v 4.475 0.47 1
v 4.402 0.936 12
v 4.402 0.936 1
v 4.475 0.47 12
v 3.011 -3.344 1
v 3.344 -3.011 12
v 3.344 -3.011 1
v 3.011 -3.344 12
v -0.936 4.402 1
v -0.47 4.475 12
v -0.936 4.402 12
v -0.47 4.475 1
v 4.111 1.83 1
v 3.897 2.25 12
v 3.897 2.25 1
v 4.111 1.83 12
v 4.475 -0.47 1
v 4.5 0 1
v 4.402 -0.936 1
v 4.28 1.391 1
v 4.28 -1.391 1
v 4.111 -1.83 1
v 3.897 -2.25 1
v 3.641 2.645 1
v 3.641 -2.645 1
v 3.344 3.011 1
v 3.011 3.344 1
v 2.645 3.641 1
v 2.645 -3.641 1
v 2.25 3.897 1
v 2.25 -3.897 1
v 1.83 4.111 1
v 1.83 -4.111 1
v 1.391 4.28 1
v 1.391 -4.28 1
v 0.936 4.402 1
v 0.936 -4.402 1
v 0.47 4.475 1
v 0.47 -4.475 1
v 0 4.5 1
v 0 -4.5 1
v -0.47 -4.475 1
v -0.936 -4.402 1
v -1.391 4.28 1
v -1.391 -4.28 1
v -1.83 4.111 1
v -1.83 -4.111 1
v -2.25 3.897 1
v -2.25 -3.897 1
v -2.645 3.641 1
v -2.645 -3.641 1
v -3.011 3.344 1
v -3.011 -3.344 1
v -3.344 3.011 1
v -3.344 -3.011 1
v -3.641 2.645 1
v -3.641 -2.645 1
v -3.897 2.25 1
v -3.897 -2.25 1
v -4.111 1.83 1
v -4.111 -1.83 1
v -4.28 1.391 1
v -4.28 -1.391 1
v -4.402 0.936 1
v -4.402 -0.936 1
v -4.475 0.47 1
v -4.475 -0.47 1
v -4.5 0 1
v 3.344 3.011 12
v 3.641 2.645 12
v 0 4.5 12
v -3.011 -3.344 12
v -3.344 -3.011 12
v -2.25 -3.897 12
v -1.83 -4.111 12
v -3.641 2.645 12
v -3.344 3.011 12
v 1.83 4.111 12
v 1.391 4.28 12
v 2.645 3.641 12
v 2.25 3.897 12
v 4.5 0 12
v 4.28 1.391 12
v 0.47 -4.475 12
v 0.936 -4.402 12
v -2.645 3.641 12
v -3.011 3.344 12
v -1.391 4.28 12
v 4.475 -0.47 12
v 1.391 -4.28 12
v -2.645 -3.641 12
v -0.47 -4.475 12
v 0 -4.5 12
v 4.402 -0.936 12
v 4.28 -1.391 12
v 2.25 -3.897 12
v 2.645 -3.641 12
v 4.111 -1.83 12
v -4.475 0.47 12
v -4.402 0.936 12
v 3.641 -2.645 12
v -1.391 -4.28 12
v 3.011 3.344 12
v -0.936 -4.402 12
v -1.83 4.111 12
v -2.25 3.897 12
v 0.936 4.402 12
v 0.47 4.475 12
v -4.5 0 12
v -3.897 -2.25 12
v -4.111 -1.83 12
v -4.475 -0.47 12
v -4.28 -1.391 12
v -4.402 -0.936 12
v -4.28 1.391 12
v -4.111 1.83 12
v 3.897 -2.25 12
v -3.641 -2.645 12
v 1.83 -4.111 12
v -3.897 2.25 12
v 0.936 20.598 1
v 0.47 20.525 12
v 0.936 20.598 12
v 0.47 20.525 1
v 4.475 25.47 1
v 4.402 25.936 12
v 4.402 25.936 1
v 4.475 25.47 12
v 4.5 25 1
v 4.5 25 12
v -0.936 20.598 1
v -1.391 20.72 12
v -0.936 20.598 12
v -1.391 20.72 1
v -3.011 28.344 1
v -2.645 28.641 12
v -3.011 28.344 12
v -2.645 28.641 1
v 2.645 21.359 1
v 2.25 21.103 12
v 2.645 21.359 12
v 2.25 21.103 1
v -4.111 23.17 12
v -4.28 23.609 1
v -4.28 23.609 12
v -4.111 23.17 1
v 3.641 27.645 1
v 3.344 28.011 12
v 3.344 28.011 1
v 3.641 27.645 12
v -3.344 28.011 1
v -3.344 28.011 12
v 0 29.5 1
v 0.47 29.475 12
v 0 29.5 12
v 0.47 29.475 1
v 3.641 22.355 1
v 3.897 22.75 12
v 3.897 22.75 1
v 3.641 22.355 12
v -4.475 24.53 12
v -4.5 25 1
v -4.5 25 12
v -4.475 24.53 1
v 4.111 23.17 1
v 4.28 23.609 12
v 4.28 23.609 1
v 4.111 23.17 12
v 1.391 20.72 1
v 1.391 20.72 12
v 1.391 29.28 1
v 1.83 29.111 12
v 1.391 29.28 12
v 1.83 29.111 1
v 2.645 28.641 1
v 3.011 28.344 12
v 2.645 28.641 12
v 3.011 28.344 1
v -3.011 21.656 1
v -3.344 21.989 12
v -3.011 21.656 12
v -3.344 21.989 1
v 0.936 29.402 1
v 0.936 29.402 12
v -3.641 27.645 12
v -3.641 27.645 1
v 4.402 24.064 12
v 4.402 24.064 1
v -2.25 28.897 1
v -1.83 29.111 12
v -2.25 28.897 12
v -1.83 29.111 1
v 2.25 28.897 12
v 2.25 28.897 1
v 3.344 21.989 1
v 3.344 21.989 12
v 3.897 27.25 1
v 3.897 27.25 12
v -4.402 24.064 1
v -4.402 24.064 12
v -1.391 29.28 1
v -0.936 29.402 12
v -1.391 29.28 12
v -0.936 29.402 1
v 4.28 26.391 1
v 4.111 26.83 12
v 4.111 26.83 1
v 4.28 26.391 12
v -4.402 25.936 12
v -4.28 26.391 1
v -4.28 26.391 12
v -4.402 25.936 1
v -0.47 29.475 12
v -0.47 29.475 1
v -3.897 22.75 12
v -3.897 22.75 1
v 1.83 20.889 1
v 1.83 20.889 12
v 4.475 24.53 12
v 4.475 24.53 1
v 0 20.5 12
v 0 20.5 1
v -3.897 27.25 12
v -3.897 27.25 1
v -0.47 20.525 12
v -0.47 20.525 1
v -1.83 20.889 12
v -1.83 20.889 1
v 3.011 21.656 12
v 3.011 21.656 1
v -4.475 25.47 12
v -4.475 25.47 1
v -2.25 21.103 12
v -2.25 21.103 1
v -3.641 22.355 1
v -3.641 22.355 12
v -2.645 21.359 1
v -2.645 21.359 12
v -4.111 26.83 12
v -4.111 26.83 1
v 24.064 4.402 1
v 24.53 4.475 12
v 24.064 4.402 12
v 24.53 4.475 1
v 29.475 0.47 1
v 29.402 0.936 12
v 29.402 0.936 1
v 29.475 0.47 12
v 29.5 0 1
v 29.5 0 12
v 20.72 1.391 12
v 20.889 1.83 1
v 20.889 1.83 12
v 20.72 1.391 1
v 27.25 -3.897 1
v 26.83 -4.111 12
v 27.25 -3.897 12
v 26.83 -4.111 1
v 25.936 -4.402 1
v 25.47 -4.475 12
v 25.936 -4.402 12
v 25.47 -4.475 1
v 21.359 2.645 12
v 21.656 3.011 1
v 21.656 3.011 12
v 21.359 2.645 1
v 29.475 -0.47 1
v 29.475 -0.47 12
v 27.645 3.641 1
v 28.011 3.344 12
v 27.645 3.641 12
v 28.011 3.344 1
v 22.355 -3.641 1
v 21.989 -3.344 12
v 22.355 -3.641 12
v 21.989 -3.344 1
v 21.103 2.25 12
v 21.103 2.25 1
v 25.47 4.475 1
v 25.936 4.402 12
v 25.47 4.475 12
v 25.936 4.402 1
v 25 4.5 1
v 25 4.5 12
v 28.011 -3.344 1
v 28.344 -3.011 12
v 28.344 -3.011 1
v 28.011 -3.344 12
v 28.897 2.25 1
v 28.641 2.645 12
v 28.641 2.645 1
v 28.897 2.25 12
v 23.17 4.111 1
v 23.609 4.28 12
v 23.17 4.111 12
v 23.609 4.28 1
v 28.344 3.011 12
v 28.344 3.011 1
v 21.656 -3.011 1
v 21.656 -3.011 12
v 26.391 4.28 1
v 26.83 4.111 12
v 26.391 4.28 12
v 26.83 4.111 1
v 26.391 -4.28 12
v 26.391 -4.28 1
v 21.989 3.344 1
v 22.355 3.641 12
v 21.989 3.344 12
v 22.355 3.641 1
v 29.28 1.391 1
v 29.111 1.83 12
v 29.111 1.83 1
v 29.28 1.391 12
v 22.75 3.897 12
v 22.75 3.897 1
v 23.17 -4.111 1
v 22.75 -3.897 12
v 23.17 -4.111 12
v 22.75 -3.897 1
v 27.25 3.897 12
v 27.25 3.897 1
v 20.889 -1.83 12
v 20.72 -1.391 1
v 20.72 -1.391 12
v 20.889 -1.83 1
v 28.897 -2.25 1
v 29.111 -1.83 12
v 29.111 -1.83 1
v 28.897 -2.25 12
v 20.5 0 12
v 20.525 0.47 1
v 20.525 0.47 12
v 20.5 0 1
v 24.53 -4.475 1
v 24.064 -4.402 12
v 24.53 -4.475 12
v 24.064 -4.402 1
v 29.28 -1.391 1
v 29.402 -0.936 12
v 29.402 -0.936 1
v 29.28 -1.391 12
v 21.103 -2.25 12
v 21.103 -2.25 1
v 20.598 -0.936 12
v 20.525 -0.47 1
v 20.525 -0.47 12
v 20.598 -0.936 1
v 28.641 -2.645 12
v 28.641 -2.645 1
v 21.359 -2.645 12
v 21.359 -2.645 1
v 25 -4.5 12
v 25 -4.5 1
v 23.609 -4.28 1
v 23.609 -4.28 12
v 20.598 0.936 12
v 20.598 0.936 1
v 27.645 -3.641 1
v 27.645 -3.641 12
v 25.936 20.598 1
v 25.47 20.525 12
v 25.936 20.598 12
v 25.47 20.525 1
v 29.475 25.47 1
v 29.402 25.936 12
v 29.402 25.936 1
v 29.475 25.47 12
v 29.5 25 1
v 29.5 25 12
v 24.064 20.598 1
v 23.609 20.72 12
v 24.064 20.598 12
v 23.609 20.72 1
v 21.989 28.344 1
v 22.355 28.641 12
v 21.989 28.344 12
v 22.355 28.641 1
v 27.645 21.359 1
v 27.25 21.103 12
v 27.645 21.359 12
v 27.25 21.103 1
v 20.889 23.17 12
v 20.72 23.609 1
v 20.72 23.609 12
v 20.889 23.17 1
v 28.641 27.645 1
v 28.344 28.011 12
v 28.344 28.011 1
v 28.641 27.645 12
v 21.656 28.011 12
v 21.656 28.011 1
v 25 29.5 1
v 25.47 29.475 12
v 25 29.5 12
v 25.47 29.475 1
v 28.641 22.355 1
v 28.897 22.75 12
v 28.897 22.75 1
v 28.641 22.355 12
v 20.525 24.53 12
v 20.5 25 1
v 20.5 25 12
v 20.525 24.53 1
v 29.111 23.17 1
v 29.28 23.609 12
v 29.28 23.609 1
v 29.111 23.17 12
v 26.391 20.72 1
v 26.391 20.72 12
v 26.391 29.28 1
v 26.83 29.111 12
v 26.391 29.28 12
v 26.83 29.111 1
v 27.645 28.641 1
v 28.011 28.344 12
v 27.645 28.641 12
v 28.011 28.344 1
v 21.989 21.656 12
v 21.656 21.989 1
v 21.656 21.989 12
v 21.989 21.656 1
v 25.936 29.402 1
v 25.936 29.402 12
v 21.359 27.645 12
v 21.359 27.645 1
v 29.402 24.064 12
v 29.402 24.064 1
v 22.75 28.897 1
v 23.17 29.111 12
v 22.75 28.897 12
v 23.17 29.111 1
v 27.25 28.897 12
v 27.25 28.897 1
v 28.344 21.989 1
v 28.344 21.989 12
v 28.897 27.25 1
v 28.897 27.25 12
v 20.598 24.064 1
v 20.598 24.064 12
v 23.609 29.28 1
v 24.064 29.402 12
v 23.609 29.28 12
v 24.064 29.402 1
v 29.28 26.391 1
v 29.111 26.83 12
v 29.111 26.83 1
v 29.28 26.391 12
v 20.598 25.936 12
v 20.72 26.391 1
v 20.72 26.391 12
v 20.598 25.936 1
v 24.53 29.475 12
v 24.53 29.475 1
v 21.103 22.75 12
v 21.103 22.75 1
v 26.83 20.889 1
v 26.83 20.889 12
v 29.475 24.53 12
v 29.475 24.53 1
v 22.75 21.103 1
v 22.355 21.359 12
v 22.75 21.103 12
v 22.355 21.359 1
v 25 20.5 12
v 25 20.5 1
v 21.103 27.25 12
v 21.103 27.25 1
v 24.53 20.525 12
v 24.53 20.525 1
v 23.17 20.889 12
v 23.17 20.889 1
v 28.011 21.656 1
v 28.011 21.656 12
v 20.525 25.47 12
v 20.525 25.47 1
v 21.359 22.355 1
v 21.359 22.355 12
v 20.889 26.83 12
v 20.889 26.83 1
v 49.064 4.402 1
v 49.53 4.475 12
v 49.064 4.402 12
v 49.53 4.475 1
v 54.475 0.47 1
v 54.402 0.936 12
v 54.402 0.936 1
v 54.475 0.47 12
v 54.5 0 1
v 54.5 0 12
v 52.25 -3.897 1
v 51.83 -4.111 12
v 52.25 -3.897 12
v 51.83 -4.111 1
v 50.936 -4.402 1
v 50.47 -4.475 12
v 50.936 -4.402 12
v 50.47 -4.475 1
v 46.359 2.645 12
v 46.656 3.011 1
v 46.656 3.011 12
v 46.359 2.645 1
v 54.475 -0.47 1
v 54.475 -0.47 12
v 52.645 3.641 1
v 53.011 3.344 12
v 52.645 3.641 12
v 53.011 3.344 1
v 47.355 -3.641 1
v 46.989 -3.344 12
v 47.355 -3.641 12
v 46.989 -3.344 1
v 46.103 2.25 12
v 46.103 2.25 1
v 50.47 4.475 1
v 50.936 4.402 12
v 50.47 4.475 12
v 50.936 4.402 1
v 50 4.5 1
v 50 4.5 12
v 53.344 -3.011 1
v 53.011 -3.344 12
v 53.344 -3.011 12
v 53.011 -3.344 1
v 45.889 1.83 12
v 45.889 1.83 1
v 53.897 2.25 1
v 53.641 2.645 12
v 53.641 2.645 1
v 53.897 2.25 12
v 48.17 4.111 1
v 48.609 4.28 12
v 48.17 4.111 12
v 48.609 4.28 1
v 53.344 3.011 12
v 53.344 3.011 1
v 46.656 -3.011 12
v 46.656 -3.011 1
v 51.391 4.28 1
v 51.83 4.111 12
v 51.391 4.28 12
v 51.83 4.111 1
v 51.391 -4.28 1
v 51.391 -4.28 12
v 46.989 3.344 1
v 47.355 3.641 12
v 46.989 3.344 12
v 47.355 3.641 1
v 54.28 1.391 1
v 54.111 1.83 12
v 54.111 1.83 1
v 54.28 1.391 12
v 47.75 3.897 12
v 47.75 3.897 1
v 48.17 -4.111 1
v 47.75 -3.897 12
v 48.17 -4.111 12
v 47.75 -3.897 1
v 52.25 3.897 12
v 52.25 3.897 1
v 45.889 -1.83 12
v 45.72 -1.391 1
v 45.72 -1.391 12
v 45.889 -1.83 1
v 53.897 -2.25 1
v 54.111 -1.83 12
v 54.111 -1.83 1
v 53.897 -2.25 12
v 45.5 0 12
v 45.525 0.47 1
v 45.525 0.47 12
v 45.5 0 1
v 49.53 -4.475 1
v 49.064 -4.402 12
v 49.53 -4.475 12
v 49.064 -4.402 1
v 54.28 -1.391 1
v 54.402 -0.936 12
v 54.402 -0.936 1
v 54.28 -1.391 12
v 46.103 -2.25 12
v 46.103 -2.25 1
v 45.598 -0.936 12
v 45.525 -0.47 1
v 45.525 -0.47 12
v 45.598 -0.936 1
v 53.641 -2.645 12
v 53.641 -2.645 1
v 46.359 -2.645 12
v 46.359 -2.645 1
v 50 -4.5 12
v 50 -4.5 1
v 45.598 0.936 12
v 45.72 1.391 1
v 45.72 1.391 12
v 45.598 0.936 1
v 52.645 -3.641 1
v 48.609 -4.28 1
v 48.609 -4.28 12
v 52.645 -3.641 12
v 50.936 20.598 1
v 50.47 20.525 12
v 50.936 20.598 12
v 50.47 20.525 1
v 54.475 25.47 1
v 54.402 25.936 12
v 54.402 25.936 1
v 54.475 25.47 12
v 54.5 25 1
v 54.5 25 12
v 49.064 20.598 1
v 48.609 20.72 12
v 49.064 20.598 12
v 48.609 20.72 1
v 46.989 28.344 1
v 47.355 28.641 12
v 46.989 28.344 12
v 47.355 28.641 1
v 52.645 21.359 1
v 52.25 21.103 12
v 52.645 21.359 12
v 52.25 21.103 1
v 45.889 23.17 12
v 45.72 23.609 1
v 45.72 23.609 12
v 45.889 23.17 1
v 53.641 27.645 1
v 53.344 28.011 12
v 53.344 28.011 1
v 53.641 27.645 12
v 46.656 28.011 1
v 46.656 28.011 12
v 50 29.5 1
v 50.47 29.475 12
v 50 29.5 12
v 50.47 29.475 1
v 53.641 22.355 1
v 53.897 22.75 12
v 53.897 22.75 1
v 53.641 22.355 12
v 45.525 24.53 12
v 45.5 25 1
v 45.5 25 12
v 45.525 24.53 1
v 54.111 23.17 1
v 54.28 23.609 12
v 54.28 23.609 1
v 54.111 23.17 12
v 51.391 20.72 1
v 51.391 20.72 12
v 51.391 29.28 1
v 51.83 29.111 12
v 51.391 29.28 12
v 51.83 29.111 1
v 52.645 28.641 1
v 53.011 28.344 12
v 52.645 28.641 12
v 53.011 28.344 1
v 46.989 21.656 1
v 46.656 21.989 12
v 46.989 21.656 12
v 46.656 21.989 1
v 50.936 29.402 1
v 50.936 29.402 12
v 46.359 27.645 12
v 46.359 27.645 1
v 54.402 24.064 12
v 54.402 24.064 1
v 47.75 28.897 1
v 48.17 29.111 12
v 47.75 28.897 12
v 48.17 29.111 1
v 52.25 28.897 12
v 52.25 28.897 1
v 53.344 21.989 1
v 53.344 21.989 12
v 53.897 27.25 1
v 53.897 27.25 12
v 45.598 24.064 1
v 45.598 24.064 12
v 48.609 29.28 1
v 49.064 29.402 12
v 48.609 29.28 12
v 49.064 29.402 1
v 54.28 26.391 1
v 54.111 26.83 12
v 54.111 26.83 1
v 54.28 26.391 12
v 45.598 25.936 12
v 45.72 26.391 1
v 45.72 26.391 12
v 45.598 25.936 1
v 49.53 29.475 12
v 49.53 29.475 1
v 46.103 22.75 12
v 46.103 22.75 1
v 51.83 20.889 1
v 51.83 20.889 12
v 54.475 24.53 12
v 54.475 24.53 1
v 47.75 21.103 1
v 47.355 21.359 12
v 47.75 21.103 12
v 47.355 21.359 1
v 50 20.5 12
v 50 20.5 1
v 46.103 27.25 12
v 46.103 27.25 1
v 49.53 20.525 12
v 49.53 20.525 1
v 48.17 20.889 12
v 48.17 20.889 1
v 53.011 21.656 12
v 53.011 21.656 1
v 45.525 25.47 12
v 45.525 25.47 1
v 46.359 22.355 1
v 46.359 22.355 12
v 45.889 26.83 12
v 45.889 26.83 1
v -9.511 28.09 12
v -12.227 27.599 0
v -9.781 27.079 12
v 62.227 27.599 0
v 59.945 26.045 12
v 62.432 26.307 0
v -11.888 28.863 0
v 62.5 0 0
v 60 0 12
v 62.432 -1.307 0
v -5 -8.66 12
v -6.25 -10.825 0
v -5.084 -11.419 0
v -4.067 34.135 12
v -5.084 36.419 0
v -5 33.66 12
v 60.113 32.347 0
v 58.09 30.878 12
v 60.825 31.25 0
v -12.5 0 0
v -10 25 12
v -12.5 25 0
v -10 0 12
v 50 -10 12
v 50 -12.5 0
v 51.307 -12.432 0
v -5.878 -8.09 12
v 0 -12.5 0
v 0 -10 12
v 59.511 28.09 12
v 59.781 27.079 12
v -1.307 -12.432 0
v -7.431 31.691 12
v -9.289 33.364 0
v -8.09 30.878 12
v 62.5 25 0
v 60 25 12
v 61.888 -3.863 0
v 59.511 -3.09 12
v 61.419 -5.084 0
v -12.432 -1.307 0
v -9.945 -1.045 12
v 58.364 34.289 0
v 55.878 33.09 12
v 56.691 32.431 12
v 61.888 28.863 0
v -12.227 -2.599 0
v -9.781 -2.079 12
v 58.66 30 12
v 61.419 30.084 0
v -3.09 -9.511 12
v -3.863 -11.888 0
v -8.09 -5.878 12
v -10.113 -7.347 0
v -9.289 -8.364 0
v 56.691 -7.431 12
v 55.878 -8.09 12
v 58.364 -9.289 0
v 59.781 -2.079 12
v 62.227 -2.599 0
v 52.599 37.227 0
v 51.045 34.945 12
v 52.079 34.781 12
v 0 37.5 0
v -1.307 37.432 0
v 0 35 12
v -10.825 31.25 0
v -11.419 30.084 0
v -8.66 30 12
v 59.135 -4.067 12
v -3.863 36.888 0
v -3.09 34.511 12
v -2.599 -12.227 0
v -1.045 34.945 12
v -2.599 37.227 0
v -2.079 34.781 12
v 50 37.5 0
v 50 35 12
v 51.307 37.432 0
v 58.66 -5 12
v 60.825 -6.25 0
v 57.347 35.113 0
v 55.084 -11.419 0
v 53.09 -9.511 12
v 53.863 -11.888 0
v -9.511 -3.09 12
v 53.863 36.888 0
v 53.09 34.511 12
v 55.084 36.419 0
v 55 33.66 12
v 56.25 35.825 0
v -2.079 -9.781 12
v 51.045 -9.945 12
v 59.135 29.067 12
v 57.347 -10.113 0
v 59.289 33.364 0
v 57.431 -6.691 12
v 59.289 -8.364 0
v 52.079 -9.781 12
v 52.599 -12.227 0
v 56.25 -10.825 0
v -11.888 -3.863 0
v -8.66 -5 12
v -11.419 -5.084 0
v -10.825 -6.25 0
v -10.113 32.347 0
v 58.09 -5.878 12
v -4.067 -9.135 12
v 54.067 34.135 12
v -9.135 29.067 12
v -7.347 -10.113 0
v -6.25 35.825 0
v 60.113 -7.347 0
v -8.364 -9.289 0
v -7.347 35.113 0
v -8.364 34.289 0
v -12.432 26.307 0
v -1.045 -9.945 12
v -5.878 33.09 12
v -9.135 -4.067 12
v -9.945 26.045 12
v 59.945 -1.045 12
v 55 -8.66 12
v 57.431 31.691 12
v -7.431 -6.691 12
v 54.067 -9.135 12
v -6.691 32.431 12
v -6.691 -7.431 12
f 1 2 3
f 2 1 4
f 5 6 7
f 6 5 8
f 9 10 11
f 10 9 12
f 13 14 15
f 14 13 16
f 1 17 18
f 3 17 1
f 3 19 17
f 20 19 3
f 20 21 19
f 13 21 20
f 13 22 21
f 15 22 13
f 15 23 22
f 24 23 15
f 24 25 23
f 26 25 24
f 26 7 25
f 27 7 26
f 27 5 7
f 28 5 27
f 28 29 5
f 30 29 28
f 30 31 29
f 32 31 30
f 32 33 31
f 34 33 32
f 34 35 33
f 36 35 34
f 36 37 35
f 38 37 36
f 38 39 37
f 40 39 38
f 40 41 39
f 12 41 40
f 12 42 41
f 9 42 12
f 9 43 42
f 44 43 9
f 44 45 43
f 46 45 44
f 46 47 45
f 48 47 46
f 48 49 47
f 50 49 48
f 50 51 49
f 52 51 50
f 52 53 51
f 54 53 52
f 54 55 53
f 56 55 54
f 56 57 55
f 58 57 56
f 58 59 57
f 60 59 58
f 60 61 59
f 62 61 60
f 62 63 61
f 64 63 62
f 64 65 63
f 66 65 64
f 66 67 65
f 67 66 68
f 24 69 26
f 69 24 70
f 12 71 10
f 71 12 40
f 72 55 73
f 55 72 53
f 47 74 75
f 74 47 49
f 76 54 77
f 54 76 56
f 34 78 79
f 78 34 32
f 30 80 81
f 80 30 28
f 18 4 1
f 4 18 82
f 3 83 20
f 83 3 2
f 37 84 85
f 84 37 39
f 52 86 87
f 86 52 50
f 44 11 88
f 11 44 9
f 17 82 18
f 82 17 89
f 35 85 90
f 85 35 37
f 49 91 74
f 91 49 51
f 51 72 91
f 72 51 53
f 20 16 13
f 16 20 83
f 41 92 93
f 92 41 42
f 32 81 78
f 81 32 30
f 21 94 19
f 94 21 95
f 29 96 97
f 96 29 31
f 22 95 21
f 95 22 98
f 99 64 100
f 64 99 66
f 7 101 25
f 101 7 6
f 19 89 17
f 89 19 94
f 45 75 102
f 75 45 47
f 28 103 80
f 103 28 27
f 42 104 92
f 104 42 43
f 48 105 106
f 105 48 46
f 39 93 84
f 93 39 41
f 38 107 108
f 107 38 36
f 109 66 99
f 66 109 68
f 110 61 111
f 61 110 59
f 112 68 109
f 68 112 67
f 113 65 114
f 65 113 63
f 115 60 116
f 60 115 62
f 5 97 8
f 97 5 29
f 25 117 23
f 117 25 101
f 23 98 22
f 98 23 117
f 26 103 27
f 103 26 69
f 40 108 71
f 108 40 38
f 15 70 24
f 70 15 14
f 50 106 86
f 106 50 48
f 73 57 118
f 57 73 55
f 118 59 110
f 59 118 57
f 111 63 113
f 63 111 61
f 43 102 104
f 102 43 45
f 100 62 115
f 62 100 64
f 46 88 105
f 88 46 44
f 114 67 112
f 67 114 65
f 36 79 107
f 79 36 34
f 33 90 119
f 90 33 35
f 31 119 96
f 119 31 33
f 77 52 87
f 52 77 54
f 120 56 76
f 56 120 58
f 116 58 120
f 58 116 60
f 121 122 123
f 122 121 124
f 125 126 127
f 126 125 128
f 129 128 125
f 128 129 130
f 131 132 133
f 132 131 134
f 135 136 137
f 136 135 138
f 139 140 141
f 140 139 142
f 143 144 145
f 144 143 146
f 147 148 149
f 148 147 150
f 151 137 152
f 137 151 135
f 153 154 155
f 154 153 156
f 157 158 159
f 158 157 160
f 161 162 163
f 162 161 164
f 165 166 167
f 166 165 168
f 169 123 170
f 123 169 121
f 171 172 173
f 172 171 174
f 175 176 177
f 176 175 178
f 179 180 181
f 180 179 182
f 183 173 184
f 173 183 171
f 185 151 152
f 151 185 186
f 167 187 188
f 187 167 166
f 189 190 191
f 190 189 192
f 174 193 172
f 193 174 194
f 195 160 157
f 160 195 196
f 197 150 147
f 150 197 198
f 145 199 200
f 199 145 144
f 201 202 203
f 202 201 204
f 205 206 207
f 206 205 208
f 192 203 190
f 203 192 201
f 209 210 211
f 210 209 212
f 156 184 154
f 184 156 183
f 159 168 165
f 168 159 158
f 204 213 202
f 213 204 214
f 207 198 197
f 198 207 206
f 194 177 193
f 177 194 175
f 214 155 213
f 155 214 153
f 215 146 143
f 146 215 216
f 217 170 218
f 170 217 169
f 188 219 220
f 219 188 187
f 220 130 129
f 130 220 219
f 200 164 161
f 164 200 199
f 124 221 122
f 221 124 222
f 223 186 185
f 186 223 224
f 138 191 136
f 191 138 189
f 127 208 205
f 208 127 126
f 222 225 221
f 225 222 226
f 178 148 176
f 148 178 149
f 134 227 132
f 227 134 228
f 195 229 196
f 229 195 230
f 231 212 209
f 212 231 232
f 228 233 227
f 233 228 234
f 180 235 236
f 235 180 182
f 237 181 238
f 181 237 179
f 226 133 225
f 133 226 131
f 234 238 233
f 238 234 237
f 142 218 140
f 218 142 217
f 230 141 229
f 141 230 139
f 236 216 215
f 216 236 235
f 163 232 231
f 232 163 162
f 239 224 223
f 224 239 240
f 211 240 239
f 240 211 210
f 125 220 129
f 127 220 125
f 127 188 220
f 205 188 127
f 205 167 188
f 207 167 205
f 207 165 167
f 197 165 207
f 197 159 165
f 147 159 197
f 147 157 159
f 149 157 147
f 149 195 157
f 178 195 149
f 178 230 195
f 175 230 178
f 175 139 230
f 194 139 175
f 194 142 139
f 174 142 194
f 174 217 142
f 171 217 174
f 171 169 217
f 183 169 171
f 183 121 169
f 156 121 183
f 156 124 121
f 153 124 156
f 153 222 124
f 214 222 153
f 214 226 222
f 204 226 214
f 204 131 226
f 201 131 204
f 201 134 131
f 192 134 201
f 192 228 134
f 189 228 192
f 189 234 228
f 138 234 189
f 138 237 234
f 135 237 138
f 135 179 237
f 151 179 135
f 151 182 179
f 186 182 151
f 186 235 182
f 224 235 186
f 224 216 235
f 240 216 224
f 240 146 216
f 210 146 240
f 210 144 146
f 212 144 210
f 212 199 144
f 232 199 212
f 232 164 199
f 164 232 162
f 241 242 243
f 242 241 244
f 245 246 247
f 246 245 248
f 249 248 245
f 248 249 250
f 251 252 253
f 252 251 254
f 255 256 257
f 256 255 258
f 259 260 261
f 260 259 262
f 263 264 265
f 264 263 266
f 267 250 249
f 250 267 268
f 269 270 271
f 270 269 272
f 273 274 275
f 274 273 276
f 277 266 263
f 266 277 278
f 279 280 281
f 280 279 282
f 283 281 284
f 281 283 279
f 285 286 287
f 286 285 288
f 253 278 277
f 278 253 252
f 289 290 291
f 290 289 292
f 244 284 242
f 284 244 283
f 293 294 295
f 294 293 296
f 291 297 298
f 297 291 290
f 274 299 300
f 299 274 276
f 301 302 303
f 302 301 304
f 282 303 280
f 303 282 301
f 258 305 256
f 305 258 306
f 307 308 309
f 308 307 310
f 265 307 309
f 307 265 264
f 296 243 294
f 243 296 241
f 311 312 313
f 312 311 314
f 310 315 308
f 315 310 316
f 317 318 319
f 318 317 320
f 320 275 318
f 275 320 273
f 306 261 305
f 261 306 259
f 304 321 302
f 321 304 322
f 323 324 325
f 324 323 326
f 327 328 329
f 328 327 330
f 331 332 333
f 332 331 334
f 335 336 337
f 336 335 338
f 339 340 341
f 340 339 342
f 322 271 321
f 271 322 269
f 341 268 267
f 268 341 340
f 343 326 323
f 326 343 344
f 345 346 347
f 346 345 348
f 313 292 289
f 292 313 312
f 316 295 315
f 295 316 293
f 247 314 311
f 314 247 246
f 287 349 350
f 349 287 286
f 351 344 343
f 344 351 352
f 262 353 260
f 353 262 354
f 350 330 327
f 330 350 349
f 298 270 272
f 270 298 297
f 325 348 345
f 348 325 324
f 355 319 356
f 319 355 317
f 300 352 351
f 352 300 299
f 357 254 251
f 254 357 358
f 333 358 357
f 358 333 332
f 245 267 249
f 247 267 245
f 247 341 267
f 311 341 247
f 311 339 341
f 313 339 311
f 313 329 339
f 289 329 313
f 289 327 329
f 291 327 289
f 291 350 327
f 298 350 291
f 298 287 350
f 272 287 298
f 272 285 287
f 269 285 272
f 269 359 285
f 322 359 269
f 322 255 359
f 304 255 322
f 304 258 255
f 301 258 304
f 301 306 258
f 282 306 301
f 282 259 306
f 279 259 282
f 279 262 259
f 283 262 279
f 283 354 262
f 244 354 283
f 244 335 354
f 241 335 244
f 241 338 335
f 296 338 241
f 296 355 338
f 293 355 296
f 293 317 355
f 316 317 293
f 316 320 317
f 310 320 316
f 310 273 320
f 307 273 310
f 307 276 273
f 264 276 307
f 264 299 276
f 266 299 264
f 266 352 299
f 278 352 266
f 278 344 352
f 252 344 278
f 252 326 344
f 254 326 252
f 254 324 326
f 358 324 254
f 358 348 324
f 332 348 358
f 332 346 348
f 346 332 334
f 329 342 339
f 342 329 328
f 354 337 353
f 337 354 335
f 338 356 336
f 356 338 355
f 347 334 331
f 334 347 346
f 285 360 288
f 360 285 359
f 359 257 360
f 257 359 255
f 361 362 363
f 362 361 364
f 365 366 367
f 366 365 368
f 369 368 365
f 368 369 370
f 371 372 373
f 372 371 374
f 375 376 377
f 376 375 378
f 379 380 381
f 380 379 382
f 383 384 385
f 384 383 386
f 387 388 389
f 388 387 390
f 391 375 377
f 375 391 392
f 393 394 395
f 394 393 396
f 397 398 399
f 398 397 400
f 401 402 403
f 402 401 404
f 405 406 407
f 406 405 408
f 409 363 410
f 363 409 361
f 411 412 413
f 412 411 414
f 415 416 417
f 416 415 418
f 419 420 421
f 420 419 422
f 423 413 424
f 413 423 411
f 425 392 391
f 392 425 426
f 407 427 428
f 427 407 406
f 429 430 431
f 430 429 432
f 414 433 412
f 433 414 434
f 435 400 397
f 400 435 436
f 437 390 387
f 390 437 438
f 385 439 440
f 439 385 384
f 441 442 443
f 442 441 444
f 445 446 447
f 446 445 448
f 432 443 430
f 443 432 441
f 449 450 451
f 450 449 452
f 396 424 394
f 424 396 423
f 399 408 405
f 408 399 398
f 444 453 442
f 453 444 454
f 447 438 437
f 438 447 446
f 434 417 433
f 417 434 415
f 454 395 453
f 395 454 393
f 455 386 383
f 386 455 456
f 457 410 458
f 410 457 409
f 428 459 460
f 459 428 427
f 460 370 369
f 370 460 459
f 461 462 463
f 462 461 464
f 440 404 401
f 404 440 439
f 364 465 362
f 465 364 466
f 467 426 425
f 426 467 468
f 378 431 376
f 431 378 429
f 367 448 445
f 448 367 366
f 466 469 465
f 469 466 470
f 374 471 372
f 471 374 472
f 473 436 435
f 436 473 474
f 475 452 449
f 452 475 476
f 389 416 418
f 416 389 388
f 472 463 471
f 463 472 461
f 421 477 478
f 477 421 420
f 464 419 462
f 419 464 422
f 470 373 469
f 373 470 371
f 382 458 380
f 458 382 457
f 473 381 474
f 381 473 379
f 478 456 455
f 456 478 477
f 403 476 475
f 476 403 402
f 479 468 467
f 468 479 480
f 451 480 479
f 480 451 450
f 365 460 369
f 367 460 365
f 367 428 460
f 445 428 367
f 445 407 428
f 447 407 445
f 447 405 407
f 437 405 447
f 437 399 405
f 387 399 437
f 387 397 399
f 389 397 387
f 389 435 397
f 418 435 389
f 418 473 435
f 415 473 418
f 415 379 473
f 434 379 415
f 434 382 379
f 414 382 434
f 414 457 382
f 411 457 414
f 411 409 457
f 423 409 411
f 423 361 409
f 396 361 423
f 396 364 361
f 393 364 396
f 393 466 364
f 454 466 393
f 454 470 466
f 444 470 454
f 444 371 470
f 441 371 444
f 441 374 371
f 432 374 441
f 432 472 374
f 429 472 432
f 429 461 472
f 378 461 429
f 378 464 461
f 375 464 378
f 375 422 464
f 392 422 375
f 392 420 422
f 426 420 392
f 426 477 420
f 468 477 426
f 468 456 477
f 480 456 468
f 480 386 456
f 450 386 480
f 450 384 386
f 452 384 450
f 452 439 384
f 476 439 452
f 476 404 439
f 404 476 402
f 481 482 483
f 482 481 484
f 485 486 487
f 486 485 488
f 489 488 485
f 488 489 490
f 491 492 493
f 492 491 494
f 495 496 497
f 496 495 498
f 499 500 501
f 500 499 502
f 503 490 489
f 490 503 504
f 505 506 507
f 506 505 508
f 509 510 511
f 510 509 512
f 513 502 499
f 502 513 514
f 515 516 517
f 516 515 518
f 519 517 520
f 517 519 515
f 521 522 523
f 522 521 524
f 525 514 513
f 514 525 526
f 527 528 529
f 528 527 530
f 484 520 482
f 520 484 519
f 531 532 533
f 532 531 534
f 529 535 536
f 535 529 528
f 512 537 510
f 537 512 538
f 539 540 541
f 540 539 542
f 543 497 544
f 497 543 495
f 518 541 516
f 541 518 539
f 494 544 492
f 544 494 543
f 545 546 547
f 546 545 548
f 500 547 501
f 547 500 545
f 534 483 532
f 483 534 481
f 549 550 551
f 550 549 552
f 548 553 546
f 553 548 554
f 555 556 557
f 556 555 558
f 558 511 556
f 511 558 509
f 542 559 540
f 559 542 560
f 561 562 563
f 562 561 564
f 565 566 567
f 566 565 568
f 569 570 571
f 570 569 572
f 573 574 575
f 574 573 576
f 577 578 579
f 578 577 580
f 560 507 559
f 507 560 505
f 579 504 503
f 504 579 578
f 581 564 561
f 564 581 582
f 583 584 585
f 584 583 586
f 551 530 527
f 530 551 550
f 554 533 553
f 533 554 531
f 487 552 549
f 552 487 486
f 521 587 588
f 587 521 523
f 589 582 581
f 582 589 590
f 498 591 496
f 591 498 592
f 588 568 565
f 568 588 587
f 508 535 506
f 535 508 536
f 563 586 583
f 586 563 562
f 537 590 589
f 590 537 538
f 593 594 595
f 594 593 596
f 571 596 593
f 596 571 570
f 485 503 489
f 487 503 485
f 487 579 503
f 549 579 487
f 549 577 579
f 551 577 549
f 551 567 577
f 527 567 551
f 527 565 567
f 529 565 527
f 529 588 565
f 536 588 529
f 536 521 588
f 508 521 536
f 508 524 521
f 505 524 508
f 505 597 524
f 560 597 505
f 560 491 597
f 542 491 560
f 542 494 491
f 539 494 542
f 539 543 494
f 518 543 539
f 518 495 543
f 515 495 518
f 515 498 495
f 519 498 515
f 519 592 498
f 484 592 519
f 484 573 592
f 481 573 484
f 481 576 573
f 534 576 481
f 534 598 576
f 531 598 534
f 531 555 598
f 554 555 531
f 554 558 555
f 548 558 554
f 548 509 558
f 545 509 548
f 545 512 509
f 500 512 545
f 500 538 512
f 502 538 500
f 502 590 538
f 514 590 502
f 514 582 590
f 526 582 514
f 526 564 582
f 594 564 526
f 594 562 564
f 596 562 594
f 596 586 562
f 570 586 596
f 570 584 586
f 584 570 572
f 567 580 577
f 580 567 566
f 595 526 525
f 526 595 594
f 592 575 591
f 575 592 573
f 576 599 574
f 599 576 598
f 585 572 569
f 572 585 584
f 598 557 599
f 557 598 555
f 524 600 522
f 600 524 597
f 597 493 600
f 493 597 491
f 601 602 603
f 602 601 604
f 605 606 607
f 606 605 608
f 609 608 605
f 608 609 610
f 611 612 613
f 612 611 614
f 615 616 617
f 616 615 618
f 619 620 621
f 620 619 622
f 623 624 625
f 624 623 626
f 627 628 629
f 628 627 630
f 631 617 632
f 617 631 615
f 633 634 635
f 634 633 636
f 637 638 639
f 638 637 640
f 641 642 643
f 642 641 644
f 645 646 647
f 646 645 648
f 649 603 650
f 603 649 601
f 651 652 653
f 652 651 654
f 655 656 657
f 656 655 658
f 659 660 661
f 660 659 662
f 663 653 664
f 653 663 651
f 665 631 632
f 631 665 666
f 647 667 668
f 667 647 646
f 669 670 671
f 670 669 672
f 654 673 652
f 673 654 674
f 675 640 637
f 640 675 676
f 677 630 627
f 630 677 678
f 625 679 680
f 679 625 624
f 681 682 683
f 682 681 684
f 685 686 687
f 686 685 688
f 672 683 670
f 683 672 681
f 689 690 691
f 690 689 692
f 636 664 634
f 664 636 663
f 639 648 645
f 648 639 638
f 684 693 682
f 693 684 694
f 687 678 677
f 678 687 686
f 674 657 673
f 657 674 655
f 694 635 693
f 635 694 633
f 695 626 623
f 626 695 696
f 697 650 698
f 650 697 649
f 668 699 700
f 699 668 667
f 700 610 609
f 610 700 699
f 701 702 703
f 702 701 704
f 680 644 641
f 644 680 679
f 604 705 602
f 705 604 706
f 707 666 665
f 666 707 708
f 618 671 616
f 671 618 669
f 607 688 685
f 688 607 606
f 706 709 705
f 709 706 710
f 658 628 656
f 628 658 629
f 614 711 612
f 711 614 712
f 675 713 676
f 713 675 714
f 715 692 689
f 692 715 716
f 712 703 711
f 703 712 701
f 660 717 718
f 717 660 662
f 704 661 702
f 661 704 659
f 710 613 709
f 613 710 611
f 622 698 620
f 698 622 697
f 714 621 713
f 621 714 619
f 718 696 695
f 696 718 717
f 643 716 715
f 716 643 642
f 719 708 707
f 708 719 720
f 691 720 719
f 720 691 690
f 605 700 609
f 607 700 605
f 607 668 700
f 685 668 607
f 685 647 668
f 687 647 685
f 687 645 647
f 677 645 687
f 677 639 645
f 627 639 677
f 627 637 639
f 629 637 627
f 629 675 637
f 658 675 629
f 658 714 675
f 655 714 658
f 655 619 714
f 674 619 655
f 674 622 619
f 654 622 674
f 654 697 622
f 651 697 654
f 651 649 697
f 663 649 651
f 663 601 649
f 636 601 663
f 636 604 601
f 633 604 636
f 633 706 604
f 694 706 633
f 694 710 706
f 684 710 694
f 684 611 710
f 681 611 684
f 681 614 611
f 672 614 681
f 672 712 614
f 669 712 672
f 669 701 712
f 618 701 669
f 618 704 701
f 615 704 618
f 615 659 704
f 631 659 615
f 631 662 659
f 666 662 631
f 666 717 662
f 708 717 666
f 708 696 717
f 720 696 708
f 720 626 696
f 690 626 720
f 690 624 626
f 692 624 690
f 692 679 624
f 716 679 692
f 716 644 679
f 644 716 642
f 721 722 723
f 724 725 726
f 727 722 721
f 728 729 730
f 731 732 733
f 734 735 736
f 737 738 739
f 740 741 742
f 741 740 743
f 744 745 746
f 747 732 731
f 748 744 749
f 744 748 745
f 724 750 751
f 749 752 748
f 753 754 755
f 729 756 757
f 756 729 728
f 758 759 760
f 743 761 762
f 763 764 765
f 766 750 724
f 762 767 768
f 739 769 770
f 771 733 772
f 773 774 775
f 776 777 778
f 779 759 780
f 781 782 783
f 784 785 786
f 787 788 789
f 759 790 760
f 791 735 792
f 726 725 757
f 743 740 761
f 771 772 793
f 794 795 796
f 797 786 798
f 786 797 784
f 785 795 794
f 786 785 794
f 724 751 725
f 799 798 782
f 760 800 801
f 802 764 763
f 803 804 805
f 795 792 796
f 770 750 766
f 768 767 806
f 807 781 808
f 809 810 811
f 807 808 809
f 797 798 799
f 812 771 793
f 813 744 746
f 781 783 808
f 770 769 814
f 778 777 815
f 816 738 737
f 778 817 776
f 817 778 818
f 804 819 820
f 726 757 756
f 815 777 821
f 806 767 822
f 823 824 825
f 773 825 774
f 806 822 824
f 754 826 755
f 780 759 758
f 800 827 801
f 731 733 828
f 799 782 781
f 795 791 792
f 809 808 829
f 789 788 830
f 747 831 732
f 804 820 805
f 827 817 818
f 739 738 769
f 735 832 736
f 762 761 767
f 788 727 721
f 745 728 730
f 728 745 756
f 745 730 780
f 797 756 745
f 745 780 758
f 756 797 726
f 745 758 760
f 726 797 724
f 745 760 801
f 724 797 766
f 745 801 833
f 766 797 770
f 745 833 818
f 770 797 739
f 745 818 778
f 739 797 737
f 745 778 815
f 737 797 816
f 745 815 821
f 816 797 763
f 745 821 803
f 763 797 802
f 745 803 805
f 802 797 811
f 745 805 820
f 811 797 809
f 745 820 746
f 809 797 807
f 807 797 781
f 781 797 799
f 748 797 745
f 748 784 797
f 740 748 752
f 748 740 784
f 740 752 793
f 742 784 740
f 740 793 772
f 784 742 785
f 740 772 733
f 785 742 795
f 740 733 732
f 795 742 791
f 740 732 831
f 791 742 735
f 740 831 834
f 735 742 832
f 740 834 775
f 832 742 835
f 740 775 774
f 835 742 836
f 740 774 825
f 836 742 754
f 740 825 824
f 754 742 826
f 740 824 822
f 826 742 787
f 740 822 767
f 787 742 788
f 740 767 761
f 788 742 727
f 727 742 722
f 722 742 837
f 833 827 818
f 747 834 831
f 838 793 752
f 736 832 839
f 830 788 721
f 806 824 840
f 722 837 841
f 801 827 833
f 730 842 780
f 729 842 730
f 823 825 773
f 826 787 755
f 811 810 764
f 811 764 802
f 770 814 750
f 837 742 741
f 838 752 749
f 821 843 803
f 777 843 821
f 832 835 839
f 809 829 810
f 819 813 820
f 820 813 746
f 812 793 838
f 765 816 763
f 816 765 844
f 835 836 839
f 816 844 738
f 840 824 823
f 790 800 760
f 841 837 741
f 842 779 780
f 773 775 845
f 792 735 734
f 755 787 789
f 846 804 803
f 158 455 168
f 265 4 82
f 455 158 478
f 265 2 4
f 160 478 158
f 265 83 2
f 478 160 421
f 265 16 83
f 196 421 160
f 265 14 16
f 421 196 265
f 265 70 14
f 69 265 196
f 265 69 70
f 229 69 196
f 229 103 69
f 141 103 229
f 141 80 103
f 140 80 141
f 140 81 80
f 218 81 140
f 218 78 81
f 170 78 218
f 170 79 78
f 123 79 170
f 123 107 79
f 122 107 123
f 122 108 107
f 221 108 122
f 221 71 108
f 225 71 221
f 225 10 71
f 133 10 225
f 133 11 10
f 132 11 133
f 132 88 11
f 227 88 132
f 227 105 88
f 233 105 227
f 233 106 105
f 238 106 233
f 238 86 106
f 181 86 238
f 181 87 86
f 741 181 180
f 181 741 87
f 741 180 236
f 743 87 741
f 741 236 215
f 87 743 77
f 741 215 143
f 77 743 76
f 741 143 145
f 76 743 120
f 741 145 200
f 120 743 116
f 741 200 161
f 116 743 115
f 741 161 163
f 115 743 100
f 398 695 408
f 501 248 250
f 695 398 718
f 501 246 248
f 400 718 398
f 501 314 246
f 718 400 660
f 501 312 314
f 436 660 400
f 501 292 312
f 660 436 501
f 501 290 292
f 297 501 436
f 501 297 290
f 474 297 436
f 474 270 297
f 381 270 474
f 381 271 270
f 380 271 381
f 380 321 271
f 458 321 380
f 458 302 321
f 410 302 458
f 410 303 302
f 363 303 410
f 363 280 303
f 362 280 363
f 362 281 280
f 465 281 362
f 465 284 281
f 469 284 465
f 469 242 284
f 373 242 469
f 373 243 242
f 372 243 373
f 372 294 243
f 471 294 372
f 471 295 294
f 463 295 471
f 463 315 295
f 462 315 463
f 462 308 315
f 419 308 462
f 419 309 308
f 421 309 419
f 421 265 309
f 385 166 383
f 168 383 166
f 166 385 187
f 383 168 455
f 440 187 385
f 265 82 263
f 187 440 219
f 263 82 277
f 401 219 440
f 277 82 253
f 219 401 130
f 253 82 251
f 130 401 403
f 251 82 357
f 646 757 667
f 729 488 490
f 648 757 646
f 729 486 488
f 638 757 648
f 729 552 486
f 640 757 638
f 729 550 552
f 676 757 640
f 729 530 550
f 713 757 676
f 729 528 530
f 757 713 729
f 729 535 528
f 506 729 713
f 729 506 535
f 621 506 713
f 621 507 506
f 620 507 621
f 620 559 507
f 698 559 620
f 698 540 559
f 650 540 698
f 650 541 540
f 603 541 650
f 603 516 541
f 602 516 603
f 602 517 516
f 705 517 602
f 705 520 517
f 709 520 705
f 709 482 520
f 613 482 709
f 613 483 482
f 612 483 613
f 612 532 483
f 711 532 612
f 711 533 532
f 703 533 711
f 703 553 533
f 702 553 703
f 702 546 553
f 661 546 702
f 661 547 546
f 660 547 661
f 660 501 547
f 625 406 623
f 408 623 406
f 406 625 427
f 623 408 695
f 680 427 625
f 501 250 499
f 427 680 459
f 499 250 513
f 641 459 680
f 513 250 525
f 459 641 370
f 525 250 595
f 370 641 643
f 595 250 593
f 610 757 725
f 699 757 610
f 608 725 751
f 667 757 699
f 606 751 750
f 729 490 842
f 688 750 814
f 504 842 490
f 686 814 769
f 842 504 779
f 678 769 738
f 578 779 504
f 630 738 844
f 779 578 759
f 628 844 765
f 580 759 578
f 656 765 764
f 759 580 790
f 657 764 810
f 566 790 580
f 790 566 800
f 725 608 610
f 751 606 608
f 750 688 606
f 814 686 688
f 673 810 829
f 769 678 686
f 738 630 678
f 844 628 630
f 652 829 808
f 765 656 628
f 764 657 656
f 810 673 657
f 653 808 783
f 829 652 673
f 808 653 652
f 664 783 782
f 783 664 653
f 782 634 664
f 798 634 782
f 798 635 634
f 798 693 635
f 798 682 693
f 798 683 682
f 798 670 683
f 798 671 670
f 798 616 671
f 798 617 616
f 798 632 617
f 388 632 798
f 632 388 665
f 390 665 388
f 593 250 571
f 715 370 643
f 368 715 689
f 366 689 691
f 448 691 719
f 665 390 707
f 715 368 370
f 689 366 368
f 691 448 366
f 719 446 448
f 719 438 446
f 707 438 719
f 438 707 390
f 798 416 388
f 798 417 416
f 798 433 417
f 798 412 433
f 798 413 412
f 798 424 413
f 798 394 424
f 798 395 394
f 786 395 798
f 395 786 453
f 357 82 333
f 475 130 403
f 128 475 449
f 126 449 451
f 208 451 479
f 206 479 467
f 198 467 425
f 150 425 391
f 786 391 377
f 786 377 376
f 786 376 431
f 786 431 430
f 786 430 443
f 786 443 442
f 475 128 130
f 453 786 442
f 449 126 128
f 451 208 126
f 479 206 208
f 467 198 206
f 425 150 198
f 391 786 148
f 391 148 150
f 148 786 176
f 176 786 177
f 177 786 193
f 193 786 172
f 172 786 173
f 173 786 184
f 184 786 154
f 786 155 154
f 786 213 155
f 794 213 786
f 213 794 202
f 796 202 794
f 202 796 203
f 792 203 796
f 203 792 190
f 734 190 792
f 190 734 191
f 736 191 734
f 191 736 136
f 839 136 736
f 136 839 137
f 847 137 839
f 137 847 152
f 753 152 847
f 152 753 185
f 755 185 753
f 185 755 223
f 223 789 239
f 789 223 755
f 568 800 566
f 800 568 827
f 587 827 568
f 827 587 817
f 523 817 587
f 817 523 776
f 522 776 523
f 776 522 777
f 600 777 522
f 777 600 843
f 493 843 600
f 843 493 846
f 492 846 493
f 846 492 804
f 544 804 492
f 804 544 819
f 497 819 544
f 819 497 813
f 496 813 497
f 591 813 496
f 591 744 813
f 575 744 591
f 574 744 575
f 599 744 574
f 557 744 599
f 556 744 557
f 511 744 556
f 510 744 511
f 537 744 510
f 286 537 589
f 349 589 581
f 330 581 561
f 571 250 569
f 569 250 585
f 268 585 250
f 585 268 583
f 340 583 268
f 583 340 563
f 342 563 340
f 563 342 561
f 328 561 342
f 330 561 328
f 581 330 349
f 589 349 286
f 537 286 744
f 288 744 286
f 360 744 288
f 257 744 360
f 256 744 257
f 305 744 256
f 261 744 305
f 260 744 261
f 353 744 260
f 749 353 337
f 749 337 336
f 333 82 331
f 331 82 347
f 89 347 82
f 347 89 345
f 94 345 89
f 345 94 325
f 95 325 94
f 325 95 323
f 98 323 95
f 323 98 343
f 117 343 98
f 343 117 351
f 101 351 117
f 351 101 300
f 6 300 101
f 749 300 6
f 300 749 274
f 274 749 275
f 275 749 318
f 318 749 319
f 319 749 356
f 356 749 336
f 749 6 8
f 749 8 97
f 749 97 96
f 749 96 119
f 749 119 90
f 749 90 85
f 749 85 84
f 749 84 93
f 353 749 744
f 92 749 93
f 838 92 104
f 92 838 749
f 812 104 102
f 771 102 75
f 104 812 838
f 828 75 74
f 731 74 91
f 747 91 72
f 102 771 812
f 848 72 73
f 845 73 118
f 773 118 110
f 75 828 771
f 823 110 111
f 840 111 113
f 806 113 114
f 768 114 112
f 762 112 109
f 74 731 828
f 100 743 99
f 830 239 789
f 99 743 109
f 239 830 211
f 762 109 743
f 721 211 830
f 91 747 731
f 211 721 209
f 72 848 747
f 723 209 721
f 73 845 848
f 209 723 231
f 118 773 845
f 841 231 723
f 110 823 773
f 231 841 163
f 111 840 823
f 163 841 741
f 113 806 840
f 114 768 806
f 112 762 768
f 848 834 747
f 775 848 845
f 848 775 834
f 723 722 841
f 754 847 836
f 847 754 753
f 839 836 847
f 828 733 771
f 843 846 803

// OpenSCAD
// Describe the support capacity
 number_of_rows=2; //[ 1, 2, 3, 4, 5, 6 , 7 , 8]
 number_of_holes_per_row=3; //[ 1, 2, 3, 4, 5, 6 , 7 , 8]


// Describe your biggest atomizer :
max_atomizer_diameter=20; //[ 16, 17, 18, 19, 20, 21 , 22 , 23, 24, 25, 26, 27, 28, 29 , 30 , 31, 32]
diameter_of_holes=9;//[ 6, 7, 8, 9, 10, 11 , 12 , 13]
hole_depth = 10; // [6,7,8,9,10,11,12,13,14]


//Additional space between holes    
 additional_space=5;// [6,7,8,9,10,11,12,13,14]


// ignore variable values

//this is a teinturman design.
//you can find the published thing from thingiverse at : 
//http://www.thingiverse.com/thing:2019106



AtomizerStand();


module AtomizerStand()
{
$fn=60;
       
 taillez=hole_depth+2;   
 base_diameter=max_atomizer_diameter+5;
 
    
 taillex=(number_of_holes_per_row-1)*(2*(max_atomizer_diameter/2)+additional_space);
 tailley=(number_of_rows-1)*(2*(max_atomizer_diameter/2)+additional_space);

  difference()
  {  

    hull()
    {
        translate([taillex,0,0])cylinder(r1= base_diameter/2,r2=(max_atomizer_diameter/2),h=taillez);
        translate([taillex,tailley,0])cylinder(r1= base_diameter/2,r2=(max_atomizer_diameter/2),h=taillez);
        translate([0,tailley,0])cylinder(r1= base_diameter/2,r2=(max_atomizer_diameter/2),h=taillez);
        translate([0,0,0])cylinder(r1= base_diameter/2,r2=(max_atomizer_diameter/2),h=taillez);
    }
    
    for (i = [0: 1:number_of_holes_per_row-1]) {
    for (j = [0:1:number_of_rows-1]) {
        translate([i*(2*(max_atomizer_diameter/2)+additional_space) ,j*(2*(max_atomizer_diameter/2)+additional_space),1])cylinder(r=diameter_of_holes/2,h=taillez);
    }
    }
 
} 
}
